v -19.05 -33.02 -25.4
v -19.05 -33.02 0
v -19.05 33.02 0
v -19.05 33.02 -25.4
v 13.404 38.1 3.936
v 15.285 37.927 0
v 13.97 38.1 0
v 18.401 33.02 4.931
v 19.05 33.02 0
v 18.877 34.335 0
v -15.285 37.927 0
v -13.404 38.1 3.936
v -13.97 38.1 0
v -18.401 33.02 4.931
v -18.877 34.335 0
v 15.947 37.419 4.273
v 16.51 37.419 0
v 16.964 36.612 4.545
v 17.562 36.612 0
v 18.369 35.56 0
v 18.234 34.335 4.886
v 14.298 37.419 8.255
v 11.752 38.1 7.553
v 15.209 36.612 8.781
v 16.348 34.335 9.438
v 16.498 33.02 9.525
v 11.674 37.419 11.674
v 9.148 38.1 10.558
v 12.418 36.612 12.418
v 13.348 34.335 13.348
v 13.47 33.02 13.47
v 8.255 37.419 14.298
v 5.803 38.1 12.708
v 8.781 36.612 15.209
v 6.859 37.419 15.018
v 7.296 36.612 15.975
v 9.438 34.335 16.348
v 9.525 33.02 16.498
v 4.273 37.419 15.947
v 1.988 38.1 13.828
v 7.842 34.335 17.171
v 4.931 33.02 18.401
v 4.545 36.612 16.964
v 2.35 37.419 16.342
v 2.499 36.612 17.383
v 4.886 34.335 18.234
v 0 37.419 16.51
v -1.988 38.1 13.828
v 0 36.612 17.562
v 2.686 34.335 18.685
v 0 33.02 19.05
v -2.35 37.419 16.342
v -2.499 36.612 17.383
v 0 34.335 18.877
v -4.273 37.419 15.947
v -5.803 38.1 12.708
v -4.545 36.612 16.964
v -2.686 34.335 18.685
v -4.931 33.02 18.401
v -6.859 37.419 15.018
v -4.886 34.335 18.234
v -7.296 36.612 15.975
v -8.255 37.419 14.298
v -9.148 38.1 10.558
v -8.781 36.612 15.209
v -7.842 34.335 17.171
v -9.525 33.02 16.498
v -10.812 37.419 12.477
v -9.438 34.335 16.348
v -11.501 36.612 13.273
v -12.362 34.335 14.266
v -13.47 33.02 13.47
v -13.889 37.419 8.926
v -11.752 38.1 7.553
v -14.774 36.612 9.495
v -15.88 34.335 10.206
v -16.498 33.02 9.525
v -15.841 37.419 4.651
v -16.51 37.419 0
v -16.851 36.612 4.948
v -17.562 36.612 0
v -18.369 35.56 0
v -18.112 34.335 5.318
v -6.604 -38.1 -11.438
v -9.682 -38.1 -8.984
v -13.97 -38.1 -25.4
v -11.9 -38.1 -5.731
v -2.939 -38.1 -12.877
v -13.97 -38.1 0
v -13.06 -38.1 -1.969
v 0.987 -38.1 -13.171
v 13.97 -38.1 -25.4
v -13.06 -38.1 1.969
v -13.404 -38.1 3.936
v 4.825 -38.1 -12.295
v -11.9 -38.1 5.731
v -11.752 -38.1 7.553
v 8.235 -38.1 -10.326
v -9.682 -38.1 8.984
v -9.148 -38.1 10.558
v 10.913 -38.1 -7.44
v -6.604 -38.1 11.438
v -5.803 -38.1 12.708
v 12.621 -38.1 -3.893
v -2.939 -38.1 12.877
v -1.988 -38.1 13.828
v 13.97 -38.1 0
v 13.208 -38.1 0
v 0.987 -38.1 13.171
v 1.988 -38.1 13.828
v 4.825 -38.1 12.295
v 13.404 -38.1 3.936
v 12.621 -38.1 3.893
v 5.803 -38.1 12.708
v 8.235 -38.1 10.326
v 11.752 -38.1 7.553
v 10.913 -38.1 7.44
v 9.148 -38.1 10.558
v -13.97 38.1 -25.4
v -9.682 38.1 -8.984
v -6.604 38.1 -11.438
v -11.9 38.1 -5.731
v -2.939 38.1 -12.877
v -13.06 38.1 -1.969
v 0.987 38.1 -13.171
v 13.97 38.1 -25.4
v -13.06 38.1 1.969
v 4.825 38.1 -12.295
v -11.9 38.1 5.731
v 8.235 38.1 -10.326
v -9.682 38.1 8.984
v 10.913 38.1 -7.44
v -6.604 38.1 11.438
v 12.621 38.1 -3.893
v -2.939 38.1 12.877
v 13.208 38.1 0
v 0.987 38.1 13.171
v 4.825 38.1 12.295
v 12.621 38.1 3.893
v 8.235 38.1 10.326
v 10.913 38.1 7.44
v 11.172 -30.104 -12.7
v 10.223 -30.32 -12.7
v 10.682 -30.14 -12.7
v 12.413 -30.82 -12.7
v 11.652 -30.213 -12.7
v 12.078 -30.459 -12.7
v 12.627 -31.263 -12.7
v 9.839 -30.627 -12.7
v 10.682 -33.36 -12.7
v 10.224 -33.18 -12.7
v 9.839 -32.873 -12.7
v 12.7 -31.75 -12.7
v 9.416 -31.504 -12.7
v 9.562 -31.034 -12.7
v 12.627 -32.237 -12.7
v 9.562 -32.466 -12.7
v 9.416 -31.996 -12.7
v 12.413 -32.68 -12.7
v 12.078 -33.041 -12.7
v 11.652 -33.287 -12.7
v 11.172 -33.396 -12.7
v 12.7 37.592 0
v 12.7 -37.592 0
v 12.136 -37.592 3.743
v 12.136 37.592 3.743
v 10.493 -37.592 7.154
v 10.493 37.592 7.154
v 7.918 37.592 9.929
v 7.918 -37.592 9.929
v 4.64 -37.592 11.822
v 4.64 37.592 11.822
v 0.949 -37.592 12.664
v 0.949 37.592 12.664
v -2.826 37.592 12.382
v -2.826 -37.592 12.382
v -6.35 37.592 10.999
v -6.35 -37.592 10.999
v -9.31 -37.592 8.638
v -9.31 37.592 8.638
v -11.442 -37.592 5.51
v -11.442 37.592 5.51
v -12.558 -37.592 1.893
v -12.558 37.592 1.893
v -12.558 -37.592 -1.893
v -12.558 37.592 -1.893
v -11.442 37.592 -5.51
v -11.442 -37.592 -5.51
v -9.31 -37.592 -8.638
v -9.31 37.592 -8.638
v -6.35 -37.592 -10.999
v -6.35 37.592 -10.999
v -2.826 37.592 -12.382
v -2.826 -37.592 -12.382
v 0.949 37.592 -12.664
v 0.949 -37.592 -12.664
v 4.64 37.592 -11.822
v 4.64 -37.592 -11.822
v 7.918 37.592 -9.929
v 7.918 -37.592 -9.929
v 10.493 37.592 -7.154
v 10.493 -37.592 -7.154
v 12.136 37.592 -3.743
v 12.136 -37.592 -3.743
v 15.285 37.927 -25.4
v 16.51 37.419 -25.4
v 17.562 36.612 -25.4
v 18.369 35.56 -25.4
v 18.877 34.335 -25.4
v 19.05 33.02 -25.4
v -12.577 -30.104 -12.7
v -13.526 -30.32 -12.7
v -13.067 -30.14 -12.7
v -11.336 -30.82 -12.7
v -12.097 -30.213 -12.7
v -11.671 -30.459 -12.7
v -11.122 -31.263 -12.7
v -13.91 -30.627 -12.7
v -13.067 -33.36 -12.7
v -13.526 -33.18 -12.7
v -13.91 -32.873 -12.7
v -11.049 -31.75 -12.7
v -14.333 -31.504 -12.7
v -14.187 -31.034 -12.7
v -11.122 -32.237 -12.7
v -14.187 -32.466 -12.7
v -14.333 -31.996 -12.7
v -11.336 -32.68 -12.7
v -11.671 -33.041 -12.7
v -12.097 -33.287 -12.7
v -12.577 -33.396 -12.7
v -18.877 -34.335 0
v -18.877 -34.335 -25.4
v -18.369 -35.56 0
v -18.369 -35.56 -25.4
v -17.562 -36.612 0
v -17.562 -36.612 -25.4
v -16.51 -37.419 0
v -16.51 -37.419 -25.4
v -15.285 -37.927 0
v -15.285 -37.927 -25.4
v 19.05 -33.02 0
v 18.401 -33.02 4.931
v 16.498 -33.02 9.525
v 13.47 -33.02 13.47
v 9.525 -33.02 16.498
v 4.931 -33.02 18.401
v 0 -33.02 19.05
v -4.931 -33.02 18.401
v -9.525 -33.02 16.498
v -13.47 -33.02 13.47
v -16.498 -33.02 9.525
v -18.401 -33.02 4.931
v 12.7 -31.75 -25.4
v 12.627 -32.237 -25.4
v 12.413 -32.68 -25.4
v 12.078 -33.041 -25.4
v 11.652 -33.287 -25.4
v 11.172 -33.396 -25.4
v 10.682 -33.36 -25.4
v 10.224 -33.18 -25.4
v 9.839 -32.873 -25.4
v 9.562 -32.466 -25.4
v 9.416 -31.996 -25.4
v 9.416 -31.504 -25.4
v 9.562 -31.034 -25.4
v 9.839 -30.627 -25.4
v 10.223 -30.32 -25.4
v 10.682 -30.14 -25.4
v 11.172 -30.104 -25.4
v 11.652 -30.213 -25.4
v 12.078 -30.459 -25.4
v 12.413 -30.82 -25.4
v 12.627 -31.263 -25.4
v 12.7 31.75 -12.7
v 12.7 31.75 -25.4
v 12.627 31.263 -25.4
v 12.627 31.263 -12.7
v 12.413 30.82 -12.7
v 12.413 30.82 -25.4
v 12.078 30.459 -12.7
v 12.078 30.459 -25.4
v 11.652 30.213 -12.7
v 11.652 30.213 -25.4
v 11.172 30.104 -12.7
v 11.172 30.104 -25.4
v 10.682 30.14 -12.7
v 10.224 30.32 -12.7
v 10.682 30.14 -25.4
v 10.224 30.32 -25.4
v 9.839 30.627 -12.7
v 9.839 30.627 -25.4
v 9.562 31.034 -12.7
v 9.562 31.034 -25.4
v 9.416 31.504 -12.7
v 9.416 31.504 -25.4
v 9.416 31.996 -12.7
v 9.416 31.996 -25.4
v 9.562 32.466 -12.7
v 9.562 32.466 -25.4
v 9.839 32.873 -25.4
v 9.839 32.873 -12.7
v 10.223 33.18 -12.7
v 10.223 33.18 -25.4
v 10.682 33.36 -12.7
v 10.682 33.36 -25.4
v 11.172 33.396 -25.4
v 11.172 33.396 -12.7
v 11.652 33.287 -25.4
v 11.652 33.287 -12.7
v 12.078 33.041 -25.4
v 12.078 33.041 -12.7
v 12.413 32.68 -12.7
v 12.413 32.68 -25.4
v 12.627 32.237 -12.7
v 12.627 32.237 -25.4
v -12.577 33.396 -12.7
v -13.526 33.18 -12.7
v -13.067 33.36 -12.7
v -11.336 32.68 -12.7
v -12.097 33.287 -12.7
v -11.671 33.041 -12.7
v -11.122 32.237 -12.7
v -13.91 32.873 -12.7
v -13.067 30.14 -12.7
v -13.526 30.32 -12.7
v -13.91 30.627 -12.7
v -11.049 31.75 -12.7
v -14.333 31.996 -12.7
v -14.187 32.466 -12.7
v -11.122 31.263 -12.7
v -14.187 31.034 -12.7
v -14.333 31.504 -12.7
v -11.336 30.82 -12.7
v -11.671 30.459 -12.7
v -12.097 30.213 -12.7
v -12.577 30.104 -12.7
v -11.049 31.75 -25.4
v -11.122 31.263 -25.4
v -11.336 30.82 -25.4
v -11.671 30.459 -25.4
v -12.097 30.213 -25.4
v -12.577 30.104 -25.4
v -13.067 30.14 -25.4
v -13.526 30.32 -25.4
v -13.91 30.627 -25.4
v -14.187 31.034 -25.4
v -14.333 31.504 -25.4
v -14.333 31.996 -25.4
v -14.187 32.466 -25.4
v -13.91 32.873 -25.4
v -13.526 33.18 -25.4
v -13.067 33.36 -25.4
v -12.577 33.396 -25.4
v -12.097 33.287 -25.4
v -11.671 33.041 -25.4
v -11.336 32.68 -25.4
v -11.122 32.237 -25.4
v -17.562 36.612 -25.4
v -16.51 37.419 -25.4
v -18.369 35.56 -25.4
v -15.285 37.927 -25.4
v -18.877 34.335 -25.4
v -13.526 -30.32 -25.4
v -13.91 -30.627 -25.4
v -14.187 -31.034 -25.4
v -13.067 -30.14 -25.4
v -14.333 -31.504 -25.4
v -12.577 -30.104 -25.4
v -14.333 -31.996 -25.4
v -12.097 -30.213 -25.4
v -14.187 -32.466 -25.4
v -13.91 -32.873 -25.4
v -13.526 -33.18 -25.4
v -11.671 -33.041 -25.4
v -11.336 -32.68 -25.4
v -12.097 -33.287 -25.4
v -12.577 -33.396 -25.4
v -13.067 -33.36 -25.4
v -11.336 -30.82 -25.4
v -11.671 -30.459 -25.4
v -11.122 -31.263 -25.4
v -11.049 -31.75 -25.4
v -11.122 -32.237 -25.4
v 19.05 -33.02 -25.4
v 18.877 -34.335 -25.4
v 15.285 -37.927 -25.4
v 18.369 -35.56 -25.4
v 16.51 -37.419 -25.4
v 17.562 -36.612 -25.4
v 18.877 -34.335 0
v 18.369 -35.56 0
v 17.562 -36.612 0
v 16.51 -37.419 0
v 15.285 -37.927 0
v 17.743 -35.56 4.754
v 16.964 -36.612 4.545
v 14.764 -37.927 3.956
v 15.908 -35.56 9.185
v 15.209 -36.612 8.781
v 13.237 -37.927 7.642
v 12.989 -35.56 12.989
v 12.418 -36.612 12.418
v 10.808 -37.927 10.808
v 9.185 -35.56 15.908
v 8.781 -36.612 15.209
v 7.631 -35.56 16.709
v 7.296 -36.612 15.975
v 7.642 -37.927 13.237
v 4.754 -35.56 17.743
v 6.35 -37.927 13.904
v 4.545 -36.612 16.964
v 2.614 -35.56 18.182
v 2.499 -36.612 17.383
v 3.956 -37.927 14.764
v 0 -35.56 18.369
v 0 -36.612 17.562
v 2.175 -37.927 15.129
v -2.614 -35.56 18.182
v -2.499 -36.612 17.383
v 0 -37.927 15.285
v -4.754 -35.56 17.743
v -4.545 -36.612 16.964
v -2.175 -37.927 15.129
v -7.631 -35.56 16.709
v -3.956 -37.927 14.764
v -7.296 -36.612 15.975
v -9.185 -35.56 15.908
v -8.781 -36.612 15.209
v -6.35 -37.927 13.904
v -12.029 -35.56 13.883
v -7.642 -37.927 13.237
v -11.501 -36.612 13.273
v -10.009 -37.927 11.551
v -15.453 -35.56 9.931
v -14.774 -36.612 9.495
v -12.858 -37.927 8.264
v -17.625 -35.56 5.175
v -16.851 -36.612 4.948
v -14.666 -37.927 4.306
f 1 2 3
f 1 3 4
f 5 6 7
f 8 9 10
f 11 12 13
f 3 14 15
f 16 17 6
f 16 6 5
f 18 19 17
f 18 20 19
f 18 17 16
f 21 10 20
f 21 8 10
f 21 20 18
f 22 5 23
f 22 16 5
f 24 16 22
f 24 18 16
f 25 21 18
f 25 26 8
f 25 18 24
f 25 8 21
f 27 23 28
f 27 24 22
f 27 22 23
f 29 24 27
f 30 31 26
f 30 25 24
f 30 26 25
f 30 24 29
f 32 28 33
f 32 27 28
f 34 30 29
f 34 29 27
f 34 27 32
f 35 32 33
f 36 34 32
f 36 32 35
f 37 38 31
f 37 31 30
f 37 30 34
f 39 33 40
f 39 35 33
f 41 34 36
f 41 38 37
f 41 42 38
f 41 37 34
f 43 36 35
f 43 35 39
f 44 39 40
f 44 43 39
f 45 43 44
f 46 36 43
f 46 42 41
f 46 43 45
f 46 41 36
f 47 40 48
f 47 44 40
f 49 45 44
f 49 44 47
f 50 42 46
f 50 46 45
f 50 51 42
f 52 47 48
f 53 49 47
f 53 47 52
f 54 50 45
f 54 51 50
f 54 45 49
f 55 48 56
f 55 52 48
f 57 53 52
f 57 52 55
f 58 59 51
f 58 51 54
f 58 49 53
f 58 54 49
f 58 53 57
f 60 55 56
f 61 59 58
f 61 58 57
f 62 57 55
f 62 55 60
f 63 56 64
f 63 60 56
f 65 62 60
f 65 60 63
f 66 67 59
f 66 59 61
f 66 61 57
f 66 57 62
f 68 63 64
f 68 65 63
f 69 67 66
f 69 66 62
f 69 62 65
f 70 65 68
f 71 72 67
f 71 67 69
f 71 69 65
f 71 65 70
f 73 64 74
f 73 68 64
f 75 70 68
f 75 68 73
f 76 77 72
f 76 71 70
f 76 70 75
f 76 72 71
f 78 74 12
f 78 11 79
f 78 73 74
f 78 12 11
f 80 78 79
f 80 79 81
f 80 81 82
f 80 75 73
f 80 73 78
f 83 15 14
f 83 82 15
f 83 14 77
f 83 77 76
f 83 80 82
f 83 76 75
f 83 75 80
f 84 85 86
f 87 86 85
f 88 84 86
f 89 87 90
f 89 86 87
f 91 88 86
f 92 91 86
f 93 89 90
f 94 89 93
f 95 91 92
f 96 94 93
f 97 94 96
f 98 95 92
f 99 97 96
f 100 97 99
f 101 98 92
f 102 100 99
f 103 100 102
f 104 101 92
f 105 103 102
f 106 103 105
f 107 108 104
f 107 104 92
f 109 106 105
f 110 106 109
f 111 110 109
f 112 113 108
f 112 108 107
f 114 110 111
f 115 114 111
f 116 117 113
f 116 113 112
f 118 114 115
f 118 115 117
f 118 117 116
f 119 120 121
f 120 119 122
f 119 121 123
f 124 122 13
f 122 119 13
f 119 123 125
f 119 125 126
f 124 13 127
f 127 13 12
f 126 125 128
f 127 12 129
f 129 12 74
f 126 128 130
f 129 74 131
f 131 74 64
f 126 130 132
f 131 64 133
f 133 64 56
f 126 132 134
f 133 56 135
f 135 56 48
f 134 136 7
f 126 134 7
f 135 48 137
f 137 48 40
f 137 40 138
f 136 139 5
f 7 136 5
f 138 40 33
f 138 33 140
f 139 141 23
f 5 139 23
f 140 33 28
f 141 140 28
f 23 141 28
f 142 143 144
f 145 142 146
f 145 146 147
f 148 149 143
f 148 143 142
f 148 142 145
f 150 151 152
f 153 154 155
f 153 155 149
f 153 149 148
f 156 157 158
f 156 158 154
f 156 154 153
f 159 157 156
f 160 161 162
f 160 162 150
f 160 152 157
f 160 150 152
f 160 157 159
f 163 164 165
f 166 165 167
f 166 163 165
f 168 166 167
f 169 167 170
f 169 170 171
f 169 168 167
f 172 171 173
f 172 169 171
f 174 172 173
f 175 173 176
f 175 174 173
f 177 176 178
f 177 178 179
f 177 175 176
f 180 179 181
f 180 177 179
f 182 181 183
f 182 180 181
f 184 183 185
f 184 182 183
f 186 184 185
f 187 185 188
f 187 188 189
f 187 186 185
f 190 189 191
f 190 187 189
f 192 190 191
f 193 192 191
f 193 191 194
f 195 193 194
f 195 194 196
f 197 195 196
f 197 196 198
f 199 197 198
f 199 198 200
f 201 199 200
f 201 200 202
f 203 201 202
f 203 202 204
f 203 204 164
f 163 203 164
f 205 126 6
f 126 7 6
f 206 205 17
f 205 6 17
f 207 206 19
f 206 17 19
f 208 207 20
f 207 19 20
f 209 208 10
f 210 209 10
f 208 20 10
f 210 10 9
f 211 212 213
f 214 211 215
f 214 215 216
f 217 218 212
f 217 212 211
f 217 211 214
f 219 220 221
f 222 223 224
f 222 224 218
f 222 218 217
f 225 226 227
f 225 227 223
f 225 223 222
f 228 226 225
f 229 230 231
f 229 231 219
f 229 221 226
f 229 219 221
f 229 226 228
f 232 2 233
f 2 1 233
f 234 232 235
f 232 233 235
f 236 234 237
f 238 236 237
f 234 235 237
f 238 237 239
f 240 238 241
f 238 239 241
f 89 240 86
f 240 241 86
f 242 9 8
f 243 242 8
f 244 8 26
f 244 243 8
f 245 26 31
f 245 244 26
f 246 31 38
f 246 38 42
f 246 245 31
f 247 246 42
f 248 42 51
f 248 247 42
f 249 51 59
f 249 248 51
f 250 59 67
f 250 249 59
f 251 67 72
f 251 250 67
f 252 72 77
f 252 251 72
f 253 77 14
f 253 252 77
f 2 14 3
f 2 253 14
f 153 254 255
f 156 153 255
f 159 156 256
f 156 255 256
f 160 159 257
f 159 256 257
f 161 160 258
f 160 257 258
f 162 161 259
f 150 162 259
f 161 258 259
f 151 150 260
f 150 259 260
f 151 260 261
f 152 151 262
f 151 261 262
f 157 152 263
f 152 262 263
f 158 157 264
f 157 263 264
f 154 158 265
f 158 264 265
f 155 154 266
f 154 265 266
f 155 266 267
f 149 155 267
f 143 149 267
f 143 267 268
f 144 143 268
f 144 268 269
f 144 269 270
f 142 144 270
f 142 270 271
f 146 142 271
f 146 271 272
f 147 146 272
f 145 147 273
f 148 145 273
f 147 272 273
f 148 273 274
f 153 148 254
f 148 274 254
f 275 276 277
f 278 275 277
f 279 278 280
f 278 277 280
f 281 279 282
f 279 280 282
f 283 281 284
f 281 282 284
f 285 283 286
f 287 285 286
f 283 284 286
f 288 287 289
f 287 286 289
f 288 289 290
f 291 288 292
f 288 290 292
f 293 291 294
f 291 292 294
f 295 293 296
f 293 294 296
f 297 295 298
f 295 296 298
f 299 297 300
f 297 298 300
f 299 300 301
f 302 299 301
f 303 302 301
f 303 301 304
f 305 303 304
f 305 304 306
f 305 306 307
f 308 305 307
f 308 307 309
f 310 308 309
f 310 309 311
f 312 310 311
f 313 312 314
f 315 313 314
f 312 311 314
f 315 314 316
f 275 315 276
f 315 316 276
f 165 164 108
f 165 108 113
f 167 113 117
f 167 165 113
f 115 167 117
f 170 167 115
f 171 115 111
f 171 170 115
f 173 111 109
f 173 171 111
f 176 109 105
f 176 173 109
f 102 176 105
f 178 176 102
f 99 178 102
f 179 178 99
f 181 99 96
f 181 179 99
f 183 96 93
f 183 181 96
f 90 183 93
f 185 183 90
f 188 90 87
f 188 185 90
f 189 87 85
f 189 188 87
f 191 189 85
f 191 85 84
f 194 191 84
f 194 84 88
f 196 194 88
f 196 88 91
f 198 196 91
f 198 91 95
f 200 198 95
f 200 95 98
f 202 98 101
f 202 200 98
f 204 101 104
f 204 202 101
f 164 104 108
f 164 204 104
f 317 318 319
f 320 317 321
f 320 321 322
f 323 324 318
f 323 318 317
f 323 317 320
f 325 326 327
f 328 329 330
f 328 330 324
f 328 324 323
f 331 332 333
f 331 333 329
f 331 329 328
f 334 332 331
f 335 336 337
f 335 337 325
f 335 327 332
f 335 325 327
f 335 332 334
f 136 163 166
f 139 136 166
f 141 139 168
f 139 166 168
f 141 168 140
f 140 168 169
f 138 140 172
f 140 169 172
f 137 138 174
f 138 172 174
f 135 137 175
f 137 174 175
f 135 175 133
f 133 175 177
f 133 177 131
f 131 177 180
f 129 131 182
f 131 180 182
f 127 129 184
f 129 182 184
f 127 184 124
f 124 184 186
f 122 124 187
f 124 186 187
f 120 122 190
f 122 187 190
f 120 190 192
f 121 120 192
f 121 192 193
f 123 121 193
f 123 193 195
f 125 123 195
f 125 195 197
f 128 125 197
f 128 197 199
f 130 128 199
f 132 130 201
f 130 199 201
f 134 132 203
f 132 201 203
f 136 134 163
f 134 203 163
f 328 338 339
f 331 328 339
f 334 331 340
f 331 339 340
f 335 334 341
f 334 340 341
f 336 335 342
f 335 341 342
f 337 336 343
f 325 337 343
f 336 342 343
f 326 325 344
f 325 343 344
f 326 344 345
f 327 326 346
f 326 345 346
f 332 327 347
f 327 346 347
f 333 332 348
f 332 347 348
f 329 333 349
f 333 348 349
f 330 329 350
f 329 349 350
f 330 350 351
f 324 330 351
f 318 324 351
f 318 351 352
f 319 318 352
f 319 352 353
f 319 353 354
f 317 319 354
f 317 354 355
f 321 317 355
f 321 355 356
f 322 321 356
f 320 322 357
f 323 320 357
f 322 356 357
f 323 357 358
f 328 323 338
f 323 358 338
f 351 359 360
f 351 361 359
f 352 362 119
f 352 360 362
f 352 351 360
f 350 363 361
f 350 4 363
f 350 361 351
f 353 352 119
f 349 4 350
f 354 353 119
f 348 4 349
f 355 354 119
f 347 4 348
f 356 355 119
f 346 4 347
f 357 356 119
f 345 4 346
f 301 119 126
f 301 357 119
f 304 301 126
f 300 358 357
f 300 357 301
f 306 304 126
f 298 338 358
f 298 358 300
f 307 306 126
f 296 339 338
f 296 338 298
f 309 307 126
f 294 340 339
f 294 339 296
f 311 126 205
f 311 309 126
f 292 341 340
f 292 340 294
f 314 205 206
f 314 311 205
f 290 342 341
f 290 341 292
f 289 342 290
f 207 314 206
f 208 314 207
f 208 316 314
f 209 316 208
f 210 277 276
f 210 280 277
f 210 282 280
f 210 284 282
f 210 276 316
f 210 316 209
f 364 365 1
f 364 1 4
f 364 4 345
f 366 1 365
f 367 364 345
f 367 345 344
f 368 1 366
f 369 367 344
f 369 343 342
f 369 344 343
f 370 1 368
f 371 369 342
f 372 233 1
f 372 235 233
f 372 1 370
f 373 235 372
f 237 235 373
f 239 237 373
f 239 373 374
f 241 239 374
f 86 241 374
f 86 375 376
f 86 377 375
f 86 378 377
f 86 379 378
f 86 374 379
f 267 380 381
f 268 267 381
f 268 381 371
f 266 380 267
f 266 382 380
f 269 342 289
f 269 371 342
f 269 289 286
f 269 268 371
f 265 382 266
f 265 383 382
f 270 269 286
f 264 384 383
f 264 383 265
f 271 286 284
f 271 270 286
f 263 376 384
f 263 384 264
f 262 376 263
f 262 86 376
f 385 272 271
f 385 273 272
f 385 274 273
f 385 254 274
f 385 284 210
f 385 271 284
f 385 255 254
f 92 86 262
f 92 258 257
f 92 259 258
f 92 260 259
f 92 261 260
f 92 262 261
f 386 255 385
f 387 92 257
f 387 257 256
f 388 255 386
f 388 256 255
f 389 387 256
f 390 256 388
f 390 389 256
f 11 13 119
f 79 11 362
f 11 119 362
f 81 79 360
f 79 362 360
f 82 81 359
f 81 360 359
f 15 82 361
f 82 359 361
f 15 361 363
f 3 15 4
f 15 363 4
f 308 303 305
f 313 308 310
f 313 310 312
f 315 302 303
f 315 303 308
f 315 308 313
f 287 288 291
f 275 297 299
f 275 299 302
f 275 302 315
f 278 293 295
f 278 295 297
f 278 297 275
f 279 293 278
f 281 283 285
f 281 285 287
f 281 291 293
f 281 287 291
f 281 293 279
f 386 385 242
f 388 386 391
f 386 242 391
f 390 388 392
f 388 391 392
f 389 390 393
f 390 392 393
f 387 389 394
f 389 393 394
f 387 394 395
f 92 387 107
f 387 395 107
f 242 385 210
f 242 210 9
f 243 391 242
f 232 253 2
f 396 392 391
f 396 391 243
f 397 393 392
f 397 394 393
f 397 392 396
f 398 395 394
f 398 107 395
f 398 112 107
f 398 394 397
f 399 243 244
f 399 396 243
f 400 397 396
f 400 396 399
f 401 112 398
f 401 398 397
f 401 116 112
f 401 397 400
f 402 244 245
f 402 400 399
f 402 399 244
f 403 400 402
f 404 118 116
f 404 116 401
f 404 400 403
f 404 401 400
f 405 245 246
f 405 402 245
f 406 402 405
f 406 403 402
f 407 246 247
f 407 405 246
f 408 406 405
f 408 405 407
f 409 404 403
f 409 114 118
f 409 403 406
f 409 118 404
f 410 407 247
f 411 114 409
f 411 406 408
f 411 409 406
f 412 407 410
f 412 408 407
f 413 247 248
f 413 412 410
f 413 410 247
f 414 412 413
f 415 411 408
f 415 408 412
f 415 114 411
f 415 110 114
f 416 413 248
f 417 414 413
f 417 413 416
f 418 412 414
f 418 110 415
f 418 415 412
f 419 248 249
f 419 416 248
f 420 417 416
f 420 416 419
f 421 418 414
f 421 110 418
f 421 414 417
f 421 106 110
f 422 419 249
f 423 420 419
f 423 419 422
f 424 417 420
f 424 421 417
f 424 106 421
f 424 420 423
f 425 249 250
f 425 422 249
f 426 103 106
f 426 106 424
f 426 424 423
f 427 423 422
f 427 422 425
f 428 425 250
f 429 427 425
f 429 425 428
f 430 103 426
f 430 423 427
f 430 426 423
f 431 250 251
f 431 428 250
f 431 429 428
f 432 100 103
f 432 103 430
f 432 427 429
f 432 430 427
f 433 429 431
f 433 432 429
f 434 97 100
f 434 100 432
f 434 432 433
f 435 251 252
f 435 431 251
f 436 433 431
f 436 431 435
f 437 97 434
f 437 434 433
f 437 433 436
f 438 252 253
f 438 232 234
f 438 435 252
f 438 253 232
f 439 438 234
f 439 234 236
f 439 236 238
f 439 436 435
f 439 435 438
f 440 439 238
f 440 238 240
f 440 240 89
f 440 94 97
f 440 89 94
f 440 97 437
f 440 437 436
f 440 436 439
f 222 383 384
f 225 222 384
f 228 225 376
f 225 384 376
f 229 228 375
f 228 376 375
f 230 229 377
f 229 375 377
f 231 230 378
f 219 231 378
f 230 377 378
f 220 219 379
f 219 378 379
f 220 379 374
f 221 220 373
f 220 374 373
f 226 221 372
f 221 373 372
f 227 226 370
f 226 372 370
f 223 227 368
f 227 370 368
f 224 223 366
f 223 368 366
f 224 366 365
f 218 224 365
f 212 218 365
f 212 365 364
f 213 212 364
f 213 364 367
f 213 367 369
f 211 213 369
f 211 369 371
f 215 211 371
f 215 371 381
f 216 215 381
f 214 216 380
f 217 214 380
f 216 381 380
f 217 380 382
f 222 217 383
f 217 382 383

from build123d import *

# Parameters (mm, degrees)
F0_R     = 12.7
F1_DEPTH = 38.1
F2_R     = 1.651
F3_DEPTH = 12.7
F4_R     = 5.08
F5_SIZE  = 0.508


with BuildPart() as f1:
    # F0 (on Front) → F1 (new body, symmetric)
    with BuildSketch(Plane.XZ):
        with BuildLine():
            Line((19.05, -25.4), (19.05, 0))
            ThreePointArc((19.05, 0), (0, 19.05), (-19.05, 0))
            Line((-19.05, 0), (-19.05, -25.4))
            Line((-19.05, -25.4), (19.05, -25.4))
        make_face()
        Circle(F0_R, mode=Mode.SUBTRACT)
    extrude(amount=F1_DEPTH, both=True)

    # F2 (on face) → F3 (cut)
    with BuildSketch(Plane(origin=(0, 0, -25.4), x_dir=(1, 0, 0), z_dir=(0, 0, -1))):
        with Locations((-12.7, 31.75)):
            Circle(F2_R)
        with Locations((11.049, 31.75)):
            Circle(F2_R)
        with Locations((-12.7, -31.75)):
            Circle(F2_R)
        with Locations((11.049, -31.75)):
            Circle(F2_R)
    extrude(amount=-F3_DEPTH, mode=Mode.SUBTRACT)

    # F4
    f4_edges = [f1.edges().sort_by_distance(p)[0] for p in [
        (0, 38.1, 19.05),
        (0, -38.1, 19.05),
    ]]
    fillet(f4_edges, radius=F4_R)

    # F5
    f5_edges = [f1.edges().sort_by_distance(p)[0] for p in [
        (-12.7, 38.1, 0),
        (-12.7, -38.1, 0),
    ]]
    chamfer(f5_edges, length=F5_SIZE)


solid = f1.part
